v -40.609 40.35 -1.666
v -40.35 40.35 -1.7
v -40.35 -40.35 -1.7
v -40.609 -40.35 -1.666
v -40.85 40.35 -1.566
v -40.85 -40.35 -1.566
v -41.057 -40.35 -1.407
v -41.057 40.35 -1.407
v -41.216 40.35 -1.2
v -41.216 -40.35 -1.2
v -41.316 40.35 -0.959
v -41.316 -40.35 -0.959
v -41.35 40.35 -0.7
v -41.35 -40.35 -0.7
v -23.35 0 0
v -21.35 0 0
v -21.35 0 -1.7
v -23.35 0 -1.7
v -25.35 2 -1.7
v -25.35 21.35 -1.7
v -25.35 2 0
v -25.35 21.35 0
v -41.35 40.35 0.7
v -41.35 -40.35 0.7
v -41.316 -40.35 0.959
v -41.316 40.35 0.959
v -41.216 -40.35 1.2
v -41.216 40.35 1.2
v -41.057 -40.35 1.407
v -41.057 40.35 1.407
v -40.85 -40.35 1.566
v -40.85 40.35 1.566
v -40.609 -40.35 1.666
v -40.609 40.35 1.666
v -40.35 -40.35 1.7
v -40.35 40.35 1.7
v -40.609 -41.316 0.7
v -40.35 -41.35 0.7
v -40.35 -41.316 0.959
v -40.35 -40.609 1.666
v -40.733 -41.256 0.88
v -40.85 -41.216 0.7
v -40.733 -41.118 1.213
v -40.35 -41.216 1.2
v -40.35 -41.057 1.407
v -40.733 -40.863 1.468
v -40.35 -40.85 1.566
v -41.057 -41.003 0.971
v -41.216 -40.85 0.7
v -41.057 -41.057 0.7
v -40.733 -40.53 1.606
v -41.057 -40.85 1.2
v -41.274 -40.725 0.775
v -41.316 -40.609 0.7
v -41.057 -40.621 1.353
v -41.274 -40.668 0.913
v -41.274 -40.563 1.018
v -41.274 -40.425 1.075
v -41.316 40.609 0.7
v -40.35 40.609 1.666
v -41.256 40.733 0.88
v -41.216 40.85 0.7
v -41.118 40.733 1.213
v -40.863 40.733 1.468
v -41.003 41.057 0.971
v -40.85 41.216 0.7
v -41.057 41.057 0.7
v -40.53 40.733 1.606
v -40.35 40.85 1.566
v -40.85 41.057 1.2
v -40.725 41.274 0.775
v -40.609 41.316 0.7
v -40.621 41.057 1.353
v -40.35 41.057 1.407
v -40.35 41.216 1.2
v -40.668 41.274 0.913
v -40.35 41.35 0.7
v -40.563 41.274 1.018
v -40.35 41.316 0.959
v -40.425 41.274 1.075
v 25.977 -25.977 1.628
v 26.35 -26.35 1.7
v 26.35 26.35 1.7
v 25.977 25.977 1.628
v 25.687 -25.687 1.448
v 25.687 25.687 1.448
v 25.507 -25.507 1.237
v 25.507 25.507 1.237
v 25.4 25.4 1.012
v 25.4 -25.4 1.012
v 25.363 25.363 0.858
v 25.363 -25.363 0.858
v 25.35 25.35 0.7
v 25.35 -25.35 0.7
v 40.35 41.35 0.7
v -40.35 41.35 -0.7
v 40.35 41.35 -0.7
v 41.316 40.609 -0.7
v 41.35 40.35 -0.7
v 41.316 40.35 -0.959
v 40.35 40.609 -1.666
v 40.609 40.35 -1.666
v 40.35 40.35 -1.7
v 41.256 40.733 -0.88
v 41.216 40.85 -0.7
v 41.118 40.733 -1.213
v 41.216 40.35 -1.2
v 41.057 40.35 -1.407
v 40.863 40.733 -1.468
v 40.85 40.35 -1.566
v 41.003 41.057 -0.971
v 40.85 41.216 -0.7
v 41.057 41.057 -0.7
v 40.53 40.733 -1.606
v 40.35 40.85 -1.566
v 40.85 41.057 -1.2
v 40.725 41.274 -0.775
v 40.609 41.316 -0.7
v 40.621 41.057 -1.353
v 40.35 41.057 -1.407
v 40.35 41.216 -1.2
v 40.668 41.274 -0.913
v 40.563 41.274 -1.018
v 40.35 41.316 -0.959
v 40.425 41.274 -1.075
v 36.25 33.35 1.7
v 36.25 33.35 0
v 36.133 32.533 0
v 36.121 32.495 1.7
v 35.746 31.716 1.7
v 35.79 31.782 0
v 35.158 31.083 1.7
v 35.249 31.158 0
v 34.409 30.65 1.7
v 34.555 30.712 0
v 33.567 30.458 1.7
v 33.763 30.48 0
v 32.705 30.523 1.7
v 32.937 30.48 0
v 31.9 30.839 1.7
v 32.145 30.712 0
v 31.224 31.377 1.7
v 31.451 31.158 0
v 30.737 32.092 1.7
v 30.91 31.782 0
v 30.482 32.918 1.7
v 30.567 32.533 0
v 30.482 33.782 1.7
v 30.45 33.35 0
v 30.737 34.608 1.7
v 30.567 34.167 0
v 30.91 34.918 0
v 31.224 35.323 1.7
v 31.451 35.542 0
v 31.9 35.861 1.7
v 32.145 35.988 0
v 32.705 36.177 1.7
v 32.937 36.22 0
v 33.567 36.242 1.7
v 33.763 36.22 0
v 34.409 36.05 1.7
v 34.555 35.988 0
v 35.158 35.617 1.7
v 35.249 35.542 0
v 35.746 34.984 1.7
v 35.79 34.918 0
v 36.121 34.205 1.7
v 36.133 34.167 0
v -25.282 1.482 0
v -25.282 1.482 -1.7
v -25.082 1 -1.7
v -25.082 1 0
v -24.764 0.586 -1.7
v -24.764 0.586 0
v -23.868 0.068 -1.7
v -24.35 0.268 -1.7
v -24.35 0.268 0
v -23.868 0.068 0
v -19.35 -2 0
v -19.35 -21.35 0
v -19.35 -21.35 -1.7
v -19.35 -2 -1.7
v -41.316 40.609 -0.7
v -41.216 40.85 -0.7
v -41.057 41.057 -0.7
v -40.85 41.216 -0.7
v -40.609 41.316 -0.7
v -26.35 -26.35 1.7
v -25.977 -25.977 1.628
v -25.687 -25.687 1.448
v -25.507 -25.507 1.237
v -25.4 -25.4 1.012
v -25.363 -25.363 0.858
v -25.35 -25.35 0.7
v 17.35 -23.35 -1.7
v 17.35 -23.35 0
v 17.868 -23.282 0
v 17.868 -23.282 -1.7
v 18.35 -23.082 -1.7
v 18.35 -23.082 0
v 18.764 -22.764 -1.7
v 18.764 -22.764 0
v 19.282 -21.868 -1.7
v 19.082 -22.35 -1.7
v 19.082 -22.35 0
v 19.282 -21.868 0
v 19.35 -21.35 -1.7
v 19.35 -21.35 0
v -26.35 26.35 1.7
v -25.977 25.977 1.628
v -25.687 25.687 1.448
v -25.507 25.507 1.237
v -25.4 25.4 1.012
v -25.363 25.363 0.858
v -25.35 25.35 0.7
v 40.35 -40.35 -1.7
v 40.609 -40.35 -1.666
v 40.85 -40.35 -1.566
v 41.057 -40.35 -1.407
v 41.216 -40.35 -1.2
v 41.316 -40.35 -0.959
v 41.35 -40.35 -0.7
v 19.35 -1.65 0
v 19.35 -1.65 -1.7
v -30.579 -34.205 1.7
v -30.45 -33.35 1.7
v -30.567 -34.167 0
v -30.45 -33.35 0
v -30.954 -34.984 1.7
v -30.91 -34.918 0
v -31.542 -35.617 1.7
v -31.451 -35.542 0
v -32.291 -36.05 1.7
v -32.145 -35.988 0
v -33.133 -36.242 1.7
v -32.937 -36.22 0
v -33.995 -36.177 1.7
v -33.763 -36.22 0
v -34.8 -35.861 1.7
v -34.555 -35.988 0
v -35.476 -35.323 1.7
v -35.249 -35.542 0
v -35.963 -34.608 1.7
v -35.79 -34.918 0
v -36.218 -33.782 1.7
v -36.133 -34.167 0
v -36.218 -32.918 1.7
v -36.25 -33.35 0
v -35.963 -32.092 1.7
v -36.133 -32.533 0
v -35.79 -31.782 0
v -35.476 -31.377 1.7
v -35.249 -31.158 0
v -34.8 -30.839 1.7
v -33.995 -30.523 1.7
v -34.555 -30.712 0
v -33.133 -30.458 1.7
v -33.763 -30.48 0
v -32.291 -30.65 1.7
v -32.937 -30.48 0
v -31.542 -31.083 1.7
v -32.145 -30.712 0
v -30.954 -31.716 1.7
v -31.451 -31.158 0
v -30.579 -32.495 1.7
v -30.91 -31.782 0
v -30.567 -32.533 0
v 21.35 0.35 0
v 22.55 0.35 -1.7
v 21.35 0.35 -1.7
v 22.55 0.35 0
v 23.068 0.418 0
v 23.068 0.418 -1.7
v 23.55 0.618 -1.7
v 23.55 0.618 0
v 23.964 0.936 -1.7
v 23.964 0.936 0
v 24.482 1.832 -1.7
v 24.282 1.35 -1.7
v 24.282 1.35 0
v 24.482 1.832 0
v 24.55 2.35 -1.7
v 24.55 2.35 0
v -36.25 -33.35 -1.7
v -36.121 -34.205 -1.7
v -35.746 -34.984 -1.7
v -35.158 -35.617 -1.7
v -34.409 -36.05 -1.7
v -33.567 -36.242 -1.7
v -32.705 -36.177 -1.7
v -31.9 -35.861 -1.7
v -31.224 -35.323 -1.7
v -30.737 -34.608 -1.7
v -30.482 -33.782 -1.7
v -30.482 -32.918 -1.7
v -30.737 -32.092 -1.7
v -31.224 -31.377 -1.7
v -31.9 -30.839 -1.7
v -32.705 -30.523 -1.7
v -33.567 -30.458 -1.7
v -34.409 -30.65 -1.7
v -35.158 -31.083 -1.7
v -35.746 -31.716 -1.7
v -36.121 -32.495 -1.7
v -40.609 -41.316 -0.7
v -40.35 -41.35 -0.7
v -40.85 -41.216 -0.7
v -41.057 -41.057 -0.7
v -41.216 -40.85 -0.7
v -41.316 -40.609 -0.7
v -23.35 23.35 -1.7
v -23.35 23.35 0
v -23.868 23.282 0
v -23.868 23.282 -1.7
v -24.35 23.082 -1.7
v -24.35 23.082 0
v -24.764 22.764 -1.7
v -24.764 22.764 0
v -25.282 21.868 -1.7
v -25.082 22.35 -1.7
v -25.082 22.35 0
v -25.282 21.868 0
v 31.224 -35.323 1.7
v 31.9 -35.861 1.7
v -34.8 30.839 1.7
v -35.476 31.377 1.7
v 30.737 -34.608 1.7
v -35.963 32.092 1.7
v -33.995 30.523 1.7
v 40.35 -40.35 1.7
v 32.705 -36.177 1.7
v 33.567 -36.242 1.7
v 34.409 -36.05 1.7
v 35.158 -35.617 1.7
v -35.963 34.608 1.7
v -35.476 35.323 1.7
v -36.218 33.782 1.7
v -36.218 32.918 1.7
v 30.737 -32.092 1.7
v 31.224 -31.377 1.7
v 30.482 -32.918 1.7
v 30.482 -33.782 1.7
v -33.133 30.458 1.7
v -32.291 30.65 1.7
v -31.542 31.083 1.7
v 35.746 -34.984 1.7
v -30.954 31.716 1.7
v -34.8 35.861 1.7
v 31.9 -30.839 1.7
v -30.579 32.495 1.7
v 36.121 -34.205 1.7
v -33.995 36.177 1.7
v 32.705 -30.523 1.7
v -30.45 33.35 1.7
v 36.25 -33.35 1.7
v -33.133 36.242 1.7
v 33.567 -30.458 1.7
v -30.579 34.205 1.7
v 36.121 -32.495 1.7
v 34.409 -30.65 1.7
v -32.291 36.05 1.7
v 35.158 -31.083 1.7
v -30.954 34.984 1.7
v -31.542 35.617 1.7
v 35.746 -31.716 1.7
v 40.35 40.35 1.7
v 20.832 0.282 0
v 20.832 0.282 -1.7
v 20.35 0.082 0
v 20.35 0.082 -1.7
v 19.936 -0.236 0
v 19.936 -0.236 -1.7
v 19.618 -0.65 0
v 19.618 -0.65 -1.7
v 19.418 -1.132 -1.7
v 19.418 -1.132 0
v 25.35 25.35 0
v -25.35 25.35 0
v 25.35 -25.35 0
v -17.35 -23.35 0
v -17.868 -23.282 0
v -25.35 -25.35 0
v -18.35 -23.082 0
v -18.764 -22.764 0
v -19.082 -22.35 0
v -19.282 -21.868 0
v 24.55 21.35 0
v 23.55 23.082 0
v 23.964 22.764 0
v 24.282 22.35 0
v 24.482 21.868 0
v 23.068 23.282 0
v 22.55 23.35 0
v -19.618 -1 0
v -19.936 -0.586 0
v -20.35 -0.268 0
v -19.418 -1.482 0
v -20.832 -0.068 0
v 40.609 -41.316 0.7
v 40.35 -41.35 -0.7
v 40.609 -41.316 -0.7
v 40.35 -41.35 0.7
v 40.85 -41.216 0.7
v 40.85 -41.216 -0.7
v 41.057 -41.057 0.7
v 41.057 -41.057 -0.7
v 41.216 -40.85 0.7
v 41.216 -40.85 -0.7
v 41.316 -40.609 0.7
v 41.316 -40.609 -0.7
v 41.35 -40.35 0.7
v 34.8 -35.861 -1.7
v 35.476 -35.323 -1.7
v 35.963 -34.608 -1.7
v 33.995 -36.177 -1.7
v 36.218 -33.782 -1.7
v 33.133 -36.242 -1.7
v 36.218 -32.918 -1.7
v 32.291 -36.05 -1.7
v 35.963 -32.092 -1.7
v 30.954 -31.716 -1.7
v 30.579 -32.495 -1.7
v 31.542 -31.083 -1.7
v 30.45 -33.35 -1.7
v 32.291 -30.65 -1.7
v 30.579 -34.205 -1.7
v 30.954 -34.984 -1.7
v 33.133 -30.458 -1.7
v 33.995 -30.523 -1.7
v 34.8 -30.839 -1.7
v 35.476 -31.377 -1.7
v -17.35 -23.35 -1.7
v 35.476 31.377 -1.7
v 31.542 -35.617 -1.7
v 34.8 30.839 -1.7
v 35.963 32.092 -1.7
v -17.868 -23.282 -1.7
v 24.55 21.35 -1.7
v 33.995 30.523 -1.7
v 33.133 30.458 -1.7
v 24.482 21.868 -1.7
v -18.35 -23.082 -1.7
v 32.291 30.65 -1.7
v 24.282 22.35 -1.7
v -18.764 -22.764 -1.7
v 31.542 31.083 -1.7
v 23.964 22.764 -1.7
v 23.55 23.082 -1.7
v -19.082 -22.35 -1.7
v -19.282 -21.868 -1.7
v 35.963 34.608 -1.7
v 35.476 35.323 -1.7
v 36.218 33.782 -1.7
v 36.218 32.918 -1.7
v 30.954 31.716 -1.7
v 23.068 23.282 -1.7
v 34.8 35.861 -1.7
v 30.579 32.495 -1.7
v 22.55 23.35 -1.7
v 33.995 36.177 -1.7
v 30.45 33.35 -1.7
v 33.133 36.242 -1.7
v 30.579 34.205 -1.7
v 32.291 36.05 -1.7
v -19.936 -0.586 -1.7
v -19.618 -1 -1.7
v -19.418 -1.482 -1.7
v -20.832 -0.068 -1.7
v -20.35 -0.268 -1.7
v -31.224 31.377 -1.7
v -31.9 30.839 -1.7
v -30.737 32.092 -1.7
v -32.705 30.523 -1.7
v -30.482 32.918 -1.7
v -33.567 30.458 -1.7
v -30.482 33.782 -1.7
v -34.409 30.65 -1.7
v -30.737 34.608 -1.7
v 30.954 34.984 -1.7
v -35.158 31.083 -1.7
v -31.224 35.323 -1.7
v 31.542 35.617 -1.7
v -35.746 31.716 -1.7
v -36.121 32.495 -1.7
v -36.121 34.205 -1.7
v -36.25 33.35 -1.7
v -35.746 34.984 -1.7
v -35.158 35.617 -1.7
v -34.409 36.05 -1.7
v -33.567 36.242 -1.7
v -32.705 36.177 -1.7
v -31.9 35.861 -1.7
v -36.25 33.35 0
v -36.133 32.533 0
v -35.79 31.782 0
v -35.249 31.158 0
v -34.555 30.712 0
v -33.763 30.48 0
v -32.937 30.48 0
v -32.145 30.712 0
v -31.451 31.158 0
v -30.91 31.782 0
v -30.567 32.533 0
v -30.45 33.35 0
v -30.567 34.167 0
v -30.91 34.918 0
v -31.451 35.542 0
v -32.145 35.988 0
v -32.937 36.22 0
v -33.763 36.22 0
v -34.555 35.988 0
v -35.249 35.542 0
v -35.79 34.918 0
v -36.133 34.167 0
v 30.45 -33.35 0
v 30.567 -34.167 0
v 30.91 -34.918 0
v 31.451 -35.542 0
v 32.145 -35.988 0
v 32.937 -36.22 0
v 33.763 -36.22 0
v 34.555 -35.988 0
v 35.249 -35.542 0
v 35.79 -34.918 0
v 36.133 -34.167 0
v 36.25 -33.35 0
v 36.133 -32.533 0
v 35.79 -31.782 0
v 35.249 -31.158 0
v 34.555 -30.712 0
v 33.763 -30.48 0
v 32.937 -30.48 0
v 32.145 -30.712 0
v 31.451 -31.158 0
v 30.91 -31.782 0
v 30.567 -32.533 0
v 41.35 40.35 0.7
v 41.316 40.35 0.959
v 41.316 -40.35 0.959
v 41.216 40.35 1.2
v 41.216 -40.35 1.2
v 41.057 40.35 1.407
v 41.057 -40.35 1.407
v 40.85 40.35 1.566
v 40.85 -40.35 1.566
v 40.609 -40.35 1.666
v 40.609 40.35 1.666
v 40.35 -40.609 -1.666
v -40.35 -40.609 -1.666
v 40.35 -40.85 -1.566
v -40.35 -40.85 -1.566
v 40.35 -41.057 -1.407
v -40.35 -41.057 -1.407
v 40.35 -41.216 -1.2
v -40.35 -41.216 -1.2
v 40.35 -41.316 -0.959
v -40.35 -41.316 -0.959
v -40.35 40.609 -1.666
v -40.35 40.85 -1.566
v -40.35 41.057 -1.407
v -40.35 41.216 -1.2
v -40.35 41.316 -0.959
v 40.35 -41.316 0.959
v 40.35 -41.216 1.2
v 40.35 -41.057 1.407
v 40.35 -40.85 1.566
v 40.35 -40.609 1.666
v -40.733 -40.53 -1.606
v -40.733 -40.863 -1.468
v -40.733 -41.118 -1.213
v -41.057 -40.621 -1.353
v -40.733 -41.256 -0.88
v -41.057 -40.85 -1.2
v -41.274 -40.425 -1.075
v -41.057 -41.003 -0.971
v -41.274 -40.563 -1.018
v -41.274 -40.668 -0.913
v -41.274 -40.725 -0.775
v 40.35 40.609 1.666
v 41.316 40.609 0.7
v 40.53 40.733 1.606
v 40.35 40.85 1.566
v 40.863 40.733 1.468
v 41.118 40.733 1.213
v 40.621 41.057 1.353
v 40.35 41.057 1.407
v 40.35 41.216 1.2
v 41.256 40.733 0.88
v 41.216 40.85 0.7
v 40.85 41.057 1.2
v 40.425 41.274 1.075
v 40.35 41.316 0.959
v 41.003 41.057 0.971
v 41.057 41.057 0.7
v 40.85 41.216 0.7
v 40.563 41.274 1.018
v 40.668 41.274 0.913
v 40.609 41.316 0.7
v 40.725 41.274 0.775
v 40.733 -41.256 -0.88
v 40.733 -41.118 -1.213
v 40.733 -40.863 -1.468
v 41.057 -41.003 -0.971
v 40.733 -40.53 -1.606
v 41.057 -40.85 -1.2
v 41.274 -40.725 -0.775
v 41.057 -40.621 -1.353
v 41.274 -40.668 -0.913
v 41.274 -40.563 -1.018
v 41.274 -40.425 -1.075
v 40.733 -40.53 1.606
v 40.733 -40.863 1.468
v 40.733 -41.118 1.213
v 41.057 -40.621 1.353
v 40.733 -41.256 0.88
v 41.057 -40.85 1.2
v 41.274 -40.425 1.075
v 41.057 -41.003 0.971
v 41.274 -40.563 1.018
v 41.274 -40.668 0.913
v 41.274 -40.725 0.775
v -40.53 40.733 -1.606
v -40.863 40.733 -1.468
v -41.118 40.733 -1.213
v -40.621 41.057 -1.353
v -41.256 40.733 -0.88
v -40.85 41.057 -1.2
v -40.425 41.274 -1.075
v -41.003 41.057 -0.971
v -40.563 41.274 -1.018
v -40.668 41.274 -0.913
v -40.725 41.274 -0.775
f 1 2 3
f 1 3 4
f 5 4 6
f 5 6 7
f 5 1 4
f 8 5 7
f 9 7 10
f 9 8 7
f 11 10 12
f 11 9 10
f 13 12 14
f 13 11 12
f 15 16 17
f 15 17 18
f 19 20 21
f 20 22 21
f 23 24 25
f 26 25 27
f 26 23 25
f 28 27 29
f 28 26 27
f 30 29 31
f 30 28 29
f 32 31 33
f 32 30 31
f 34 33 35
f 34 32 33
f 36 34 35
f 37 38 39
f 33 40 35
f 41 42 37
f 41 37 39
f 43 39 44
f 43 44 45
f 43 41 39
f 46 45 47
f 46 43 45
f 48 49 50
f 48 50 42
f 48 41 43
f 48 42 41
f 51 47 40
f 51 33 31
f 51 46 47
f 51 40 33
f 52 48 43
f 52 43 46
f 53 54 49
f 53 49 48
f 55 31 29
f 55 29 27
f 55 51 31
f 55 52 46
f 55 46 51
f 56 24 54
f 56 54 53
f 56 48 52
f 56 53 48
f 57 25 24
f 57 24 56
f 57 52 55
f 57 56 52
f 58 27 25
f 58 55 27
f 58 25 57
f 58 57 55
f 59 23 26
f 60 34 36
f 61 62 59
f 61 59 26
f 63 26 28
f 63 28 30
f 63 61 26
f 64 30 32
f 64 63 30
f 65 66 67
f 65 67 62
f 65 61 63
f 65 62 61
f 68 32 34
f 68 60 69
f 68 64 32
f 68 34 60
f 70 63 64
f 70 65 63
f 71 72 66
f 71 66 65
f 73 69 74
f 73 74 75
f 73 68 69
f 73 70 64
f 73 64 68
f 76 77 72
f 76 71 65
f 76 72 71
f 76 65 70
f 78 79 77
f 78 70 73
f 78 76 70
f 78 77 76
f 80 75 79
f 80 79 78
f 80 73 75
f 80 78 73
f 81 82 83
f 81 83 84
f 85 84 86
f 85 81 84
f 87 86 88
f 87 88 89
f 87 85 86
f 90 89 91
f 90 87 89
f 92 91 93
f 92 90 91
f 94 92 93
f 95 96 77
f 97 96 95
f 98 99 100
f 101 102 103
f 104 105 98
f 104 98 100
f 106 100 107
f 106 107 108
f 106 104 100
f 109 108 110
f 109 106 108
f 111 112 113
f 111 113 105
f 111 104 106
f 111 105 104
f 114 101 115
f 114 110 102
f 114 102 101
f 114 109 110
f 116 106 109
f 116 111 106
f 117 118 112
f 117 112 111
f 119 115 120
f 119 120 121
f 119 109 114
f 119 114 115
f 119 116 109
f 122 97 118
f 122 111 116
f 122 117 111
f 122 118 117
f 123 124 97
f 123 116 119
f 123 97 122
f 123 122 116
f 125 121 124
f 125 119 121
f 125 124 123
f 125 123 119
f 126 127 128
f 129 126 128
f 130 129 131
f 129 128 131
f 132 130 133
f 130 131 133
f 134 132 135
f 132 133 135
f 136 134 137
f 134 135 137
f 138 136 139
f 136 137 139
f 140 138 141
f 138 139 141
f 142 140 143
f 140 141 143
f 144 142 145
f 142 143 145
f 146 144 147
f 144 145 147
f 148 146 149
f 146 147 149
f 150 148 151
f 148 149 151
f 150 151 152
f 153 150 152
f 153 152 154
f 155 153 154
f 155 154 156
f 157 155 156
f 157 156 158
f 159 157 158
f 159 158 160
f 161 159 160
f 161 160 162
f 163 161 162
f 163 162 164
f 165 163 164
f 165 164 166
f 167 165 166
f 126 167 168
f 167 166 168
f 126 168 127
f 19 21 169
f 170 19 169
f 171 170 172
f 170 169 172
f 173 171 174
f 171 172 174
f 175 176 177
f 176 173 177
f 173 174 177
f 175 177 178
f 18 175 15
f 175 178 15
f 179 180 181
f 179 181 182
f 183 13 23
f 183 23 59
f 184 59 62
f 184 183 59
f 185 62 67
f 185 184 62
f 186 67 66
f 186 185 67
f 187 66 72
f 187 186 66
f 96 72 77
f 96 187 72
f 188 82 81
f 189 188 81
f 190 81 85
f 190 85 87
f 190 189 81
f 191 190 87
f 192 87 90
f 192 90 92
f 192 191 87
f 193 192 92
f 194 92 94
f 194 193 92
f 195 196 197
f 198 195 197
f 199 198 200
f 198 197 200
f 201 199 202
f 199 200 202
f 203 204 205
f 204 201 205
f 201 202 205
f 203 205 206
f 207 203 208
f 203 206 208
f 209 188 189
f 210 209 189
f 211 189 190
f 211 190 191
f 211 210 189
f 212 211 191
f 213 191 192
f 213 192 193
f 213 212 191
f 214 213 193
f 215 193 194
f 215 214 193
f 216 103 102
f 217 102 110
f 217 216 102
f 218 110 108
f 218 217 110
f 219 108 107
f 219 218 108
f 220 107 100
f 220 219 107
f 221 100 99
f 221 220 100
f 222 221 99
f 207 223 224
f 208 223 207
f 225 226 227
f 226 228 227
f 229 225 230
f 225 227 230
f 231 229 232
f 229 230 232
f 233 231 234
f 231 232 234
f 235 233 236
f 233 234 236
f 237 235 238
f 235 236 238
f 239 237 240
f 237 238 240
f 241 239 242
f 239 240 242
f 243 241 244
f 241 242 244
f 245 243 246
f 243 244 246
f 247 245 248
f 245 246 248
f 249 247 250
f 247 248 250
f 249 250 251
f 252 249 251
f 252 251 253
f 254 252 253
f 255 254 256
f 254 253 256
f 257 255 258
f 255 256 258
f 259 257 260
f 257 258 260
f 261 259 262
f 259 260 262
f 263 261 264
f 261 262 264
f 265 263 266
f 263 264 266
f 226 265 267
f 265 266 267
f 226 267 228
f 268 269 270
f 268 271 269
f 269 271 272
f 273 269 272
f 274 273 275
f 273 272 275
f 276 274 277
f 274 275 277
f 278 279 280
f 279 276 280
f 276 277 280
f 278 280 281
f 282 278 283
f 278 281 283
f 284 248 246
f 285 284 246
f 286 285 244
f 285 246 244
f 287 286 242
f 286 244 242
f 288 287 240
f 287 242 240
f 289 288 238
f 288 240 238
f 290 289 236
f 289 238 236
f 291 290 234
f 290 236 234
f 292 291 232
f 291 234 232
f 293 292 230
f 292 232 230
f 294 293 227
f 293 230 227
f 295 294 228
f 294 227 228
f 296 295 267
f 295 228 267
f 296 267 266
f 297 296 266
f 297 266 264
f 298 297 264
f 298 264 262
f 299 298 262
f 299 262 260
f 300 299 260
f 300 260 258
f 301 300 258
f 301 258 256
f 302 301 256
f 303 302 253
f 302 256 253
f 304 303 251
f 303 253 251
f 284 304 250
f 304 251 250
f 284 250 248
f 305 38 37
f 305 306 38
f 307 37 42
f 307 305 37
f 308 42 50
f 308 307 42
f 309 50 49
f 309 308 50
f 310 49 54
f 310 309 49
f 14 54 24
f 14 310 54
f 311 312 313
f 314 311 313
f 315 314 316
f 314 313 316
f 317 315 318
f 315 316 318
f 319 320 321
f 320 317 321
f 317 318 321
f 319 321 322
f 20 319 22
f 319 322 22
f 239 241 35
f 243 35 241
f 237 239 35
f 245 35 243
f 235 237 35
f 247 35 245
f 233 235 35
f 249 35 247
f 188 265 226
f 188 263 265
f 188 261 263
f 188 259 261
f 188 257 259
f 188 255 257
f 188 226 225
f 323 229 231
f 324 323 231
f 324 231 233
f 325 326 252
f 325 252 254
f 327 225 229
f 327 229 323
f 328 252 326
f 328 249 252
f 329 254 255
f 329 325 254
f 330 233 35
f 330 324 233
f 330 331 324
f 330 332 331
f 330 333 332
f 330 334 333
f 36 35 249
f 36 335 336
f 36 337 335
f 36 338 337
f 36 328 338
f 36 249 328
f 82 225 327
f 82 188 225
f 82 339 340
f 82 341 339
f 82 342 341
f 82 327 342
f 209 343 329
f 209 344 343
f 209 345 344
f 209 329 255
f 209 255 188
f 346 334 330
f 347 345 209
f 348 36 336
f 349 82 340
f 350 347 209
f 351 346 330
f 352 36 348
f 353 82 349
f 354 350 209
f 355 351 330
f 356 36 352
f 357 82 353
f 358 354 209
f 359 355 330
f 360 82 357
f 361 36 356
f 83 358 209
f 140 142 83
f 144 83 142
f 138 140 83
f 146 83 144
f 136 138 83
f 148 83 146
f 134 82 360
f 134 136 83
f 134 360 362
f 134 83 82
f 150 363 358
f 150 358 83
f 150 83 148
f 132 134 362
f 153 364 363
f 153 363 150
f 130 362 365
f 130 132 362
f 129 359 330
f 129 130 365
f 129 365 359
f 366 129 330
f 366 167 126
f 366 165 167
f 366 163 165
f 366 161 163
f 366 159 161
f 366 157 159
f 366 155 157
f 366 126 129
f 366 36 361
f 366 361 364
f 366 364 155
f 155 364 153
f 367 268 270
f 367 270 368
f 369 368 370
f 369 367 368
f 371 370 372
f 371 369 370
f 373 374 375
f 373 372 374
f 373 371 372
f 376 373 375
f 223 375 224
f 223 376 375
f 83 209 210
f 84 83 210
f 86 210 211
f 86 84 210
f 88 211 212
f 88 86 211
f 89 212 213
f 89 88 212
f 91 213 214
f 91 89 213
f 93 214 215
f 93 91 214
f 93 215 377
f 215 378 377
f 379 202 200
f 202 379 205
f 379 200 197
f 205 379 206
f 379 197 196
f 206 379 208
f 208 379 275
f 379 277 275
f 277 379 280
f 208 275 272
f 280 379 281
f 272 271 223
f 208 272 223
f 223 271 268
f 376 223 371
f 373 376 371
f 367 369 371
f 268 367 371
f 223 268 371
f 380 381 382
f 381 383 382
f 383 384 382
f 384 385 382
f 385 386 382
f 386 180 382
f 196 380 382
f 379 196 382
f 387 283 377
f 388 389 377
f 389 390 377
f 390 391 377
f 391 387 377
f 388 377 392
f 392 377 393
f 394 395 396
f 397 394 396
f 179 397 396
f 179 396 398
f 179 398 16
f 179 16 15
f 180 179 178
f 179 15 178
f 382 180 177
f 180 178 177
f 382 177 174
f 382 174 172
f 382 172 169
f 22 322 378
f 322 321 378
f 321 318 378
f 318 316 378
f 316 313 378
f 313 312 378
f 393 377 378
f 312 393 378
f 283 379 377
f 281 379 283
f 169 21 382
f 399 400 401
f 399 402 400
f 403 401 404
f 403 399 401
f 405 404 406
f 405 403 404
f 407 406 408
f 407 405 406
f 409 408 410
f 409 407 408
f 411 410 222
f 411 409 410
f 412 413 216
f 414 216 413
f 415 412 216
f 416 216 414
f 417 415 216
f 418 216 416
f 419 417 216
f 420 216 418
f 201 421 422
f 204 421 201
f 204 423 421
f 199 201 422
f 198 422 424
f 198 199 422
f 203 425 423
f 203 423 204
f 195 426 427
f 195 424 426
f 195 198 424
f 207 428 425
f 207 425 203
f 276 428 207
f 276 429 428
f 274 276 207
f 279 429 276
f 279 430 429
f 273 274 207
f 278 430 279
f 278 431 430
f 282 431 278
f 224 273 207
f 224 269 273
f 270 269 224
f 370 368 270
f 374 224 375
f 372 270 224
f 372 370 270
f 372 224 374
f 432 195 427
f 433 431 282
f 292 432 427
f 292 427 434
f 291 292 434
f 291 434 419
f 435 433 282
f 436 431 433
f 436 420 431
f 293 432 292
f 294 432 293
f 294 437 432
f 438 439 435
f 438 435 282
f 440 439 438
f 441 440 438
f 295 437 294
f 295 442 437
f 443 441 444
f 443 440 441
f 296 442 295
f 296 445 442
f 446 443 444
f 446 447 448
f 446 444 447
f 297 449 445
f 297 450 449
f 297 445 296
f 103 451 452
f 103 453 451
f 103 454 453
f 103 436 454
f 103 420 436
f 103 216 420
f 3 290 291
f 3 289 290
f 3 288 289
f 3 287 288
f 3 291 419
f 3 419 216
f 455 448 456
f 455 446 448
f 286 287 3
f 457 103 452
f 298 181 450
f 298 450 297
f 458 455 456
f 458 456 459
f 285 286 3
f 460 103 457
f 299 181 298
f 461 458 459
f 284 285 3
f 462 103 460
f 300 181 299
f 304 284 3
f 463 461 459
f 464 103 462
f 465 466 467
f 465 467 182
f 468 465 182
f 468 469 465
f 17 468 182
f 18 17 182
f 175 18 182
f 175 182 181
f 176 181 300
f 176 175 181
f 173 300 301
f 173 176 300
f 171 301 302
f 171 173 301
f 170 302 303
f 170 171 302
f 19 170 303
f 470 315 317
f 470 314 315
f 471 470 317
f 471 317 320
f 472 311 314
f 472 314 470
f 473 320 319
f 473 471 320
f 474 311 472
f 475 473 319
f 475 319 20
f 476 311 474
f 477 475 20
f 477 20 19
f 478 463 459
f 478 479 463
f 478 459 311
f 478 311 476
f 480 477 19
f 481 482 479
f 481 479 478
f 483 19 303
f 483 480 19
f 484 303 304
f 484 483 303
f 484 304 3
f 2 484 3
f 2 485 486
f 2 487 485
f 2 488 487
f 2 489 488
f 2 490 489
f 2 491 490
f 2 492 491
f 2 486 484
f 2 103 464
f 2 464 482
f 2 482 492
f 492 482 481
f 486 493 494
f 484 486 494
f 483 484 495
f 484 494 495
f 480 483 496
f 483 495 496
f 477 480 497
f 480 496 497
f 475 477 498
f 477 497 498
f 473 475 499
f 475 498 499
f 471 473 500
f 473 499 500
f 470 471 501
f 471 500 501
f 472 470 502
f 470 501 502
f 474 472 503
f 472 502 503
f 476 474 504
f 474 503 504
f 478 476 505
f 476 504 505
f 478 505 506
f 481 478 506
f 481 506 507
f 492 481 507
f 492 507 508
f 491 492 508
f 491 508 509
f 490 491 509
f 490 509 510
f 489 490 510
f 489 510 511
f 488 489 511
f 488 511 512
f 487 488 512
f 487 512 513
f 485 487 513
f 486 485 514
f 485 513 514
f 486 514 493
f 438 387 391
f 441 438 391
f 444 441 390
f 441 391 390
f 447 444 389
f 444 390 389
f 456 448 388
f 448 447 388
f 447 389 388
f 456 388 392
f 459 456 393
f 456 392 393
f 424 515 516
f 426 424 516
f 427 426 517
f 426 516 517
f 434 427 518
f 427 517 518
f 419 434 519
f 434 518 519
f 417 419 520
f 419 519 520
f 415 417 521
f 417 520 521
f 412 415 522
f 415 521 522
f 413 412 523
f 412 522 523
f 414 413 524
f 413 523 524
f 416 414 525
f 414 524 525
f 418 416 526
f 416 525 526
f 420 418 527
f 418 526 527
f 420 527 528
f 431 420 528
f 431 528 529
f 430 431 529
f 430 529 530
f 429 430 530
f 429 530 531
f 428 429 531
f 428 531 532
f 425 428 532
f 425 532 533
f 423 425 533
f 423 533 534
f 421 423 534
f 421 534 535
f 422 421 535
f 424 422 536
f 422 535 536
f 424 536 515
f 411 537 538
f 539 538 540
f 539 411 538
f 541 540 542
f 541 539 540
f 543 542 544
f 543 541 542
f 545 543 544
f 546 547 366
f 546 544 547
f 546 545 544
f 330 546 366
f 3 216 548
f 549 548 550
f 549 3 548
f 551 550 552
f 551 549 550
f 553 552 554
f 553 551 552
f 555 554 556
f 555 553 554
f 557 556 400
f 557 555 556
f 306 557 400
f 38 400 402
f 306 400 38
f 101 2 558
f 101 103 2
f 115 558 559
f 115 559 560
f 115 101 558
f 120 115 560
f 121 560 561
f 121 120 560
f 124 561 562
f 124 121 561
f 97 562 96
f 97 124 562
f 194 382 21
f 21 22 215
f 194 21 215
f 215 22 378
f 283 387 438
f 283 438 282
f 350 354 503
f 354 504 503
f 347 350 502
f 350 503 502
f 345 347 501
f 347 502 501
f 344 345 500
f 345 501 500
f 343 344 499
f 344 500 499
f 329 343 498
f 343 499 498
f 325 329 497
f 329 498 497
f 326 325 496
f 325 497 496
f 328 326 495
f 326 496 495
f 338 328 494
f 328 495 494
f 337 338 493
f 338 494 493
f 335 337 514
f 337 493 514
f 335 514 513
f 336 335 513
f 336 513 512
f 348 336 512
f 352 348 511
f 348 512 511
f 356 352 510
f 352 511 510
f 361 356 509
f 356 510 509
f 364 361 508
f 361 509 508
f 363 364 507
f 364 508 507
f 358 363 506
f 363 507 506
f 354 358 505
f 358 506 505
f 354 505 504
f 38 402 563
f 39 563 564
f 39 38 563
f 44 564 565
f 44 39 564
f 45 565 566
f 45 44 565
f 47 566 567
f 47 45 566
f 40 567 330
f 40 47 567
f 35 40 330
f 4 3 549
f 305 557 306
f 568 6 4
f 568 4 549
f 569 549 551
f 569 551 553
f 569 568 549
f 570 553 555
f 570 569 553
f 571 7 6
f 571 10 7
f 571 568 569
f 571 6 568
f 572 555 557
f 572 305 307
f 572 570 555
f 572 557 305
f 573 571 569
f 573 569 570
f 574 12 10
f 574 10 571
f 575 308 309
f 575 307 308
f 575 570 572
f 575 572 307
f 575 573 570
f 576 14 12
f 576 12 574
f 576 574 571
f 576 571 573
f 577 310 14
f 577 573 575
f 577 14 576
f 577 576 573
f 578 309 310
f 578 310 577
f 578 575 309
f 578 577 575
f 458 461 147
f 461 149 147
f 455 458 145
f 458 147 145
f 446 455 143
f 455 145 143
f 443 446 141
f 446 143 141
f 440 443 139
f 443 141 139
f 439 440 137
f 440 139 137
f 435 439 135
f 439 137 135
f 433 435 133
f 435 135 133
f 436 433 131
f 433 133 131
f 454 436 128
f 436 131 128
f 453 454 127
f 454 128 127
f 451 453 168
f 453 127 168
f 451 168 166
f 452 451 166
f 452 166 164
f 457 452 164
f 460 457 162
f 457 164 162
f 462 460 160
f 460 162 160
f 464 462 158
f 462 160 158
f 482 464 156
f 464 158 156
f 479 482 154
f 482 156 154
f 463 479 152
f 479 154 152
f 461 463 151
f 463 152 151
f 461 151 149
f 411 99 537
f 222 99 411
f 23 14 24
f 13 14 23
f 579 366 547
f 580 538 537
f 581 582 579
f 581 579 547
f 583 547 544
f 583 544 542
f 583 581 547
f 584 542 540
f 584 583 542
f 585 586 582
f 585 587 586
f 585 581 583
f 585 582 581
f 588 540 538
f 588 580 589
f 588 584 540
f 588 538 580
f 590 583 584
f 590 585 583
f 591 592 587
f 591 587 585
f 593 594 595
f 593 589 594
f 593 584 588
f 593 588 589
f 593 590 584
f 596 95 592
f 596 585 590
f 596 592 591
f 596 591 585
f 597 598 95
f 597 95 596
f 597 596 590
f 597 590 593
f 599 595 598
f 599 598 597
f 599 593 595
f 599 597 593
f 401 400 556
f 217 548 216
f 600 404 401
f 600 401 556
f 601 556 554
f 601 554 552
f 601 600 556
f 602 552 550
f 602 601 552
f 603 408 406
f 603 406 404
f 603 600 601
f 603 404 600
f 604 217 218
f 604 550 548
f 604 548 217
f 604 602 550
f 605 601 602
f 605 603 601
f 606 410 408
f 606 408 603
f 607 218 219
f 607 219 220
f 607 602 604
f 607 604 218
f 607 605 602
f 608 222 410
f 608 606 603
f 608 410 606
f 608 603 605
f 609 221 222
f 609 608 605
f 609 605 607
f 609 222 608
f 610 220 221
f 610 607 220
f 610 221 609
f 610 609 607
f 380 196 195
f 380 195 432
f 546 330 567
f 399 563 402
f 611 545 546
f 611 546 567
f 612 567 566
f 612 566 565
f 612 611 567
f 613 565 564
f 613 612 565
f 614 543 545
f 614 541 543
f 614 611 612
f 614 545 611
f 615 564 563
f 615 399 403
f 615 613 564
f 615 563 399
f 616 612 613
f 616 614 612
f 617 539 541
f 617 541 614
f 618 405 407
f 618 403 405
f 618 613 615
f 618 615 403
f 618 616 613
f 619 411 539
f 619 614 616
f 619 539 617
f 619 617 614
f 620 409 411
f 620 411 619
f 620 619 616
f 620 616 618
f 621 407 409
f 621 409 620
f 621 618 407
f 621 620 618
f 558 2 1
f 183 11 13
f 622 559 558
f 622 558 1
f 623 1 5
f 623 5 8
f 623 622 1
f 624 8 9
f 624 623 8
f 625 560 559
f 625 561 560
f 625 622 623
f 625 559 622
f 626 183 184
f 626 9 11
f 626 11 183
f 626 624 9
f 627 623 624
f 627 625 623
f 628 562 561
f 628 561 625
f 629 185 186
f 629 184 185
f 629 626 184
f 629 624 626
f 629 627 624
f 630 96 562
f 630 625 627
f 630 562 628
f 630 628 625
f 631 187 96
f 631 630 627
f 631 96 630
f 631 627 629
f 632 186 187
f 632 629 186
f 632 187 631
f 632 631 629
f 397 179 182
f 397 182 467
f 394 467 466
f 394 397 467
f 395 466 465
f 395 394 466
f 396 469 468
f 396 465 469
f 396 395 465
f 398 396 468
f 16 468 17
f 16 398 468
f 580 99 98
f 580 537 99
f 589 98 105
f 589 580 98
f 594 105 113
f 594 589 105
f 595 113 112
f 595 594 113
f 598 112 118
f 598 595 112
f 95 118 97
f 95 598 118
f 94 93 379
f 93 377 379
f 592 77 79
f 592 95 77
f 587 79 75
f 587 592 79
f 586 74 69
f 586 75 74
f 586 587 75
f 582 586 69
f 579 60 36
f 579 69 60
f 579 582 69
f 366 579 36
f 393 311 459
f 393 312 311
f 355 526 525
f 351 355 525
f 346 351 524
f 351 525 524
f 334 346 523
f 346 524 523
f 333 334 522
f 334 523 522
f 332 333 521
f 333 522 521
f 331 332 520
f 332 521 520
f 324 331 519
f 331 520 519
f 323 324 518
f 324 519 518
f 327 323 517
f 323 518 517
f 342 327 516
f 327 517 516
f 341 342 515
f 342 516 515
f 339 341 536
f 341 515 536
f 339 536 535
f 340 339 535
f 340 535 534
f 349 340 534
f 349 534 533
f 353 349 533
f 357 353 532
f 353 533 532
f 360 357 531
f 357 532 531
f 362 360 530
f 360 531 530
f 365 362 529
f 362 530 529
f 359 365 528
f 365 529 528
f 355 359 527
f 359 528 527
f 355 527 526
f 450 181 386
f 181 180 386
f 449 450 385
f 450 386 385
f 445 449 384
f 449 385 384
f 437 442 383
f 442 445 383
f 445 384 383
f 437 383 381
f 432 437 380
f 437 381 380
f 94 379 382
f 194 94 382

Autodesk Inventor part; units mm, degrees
ref_plane "YZ Plane" through (0, 0, 0) normal (1, 0, 0) x (0, 1, 0)
ref_plane "XZ Plane" through (0, 0, 0) normal (0, 1, 0) x (-1, 0, 0)
ref_plane "XY Plane" through (0, 0, 0) normal (0, 0, 1) x (1, 0, 0)
sketch "Sketch1" plane through (0, 0, 0) normal (0, 0, 1) x (1, 0, 0)
  line L0 (-25.35, 25.35) -> (25.35, 25.35)
  line L1 (25.35, 25.35) -> (25.35, -25.35)
  line L2 (25.35, -25.35) -> (-25.35, -25.35)
  line L3 (-25.35, -25.35) -> (-25.35, 25.35)
  line L4 (-25.35, 25.35) -> (25.35, -25.35) construction
  line L5 (25.35, 25.35) -> (-25.35, -25.35) construction
  line L6 (-41.35, 41.35) -> (41.35, 41.35)
  line L7 (41.35, 41.35) -> (41.35, -41.35)
  line L8 (41.35, -41.35) -> (-41.35, -41.35)
  line L9 (-41.35, -41.35) -> (-41.35, 41.35)
  line L10 (-41.35, 41.35) -> (41.35, -41.35) construction
  line L11 (41.35, 41.35) -> (-41.35, -41.35) construction
  line L12 (-33.35, -33.35) -> (33.35, -33.35) construction
  line L13 (33.35, -33.35) -> (33.35, 33.35) construction
  line L14 (33.35, 33.35) -> (-33.35, 33.35) construction
  line L15 (-33.35, 33.35) -> (-33.35, -33.35) construction
  line L16 (-33.35, -33.35) -> (33.35, 33.35) construction
  line L17 (33.35, -33.35) -> (-33.35, 33.35) construction
  circle A0 centre (-33.35, 33.35) radius 2.9
  circle A1 centre (33.35, 33.35) radius 2.9
  circle A2 centre (33.35, -33.35) radius 2.9
  circle A3 centre (-33.35, -33.35) radius 2.9
  point P0 (0, 0)
  dimension "d0" = 50.7
  dimension "d1" = 50.7
  dimension "d2" = 16
  dimension "d3" = 8
  dimension "d4" = 16
  dimension "d5" = 5.8
extrude "Extrusion1" add sketch "Sketch1" along normal blind 1.7
sketch "Sketch2" plane through (0, 0, 0) normal (0, 0, -1) x (-1, 0, 0)
  line L0 (-25.35, -25.35) -> (-25.35, 25.35) projected
  line L1 (-25.35, 25.35) -> (25.35, 25.35) projected
  line L2 (25.35, 25.35) -> (25.35, -25.35) projected
  line L3 (25.35, -25.35) -> (-25.35, -25.35) projected
  circle A0 centre (33.35, -33.35) radius 2.9 projected
  circle A1 centre (-33.35, -33.35) radius 2.9 projected
  circle A2 centre (-33.35, 33.35) radius 2.9 projected
  circle A3 centre (33.35, 33.35) radius 2.9 projected
  line L4 (41.35, 41.35) -> (-41.35, 41.35) projected
  line L5 (-41.35, 41.35) -> (-41.35, -41.35) projected
  line L6 (-41.35, -41.35) -> (41.35, -41.35) projected
  line L7 (41.35, -41.35) -> (41.35, 41.35) projected
  line L8 (-24.55, 21.35) -> (-24.55, 2.35)
  line L9 (-17.35, -23.35) -> (17.35, -23.35)
  line L10 (19.35, -21.35) -> (19.35, -2)
  line L11 (23.35, 23.35) -> (-22.55, 23.35)
  line L12 (21.35, 0) -> (23.35, 0)
  line L13 (-22.55, 0.35) -> (-21.35, 0.35)
  line L14 (-19.35, -1.65) -> (-19.35, -21.35)
  arc A4 (-22.55, 23.35) -> (-24.55, 21.35) centre (-22.55, 21.35) ccw
  arc A5 (-24.55, 2.35) -> (-22.55, 0.35) centre (-22.55, 2.35) ccw
  arc A6 (-19.35, -1.65) -> (-21.35, 0.35) centre (-21.35, -1.65) ccw
  arc A7 (-19.35, -21.35) -> (-17.35, -23.35) centre (-17.35, -21.35) ccw
  arc A8 (17.35, -23.35) -> (19.35, -21.35) centre (17.35, -21.35) ccw
  arc A9 (21.35, 0) -> (19.35, -2) centre (21.35, -2) ccw
  line L15 (25.35, 21.35) -> (25.35, 2)
  arc A10 (25.35, 21.35) -> (23.35, 23.35) centre (23.35, 21.35) ccw
  arc A11 (23.35, 0) -> (25.35, 2) centre (23.35, 2) ccw
  point P0 (0, 0)
  point P1 (25.35, 23.35)
  point P2 (25.35, 0)
  dimension "d8" = 0.8
  dimension "d9" = 6
  dimension "d10" = 6
  dimension "d11" = 2
  dimension "d12" = 2
  dimension "d13" = 41
  dimension "d14" = 2
  dimension "d15" = 2
extrude "Extrusion2" add sketch "Sketch2" along normal blind 1.7 contours L0 L1 L2 A10 L11 A4 L8 A5 L13 A6 L14 A7 L9 A8 L10 A9 L12 A11 L3 | L7 L6 L5 L4
fillet "Fillet1" radius 1 12 edges at (0, 41.35, 1.7) (-41.35, 0, 1.7) (0, -41.35, 1.7) (41.35, 0, 1.7) (0, 41.35, -1.7) (41.35, 0, -1.7) (0, -41.35, -1.7) (-41.35, 0, -1.7) (25.35, 0, 1.7) (0, -25.35, 1.7) (-25.35, 0, 1.7) (0, 25.35, 1.7)
fillet "Fillet2" radius 1 12 edges at (-41.0571, -41.0571, -1.4071) (-41.0571, -41.0571, 1.4071) (-41.35, -41.35, 0) (41.35, -41.35, 0) (41.0571, -41.0571, -1.4071) (41.0571, -41.0571, 1.4071) (41.35, 41.35, 0) (41.0571, 41.0571, -1.4071) (41.0571, 41.0571, 1.4071) (-41.0571, 41.0571, 1.4071) (-41.0571, 41.0571, -1.4071) (-41.35, 41.35, 0)
equation "\"d3\" = 0.5 * d2"
equation "\"d4\" = d2"
equation "\"d10\" = d9"
equation "\"d11\" = d12"
properties part number "Jig_Power"
